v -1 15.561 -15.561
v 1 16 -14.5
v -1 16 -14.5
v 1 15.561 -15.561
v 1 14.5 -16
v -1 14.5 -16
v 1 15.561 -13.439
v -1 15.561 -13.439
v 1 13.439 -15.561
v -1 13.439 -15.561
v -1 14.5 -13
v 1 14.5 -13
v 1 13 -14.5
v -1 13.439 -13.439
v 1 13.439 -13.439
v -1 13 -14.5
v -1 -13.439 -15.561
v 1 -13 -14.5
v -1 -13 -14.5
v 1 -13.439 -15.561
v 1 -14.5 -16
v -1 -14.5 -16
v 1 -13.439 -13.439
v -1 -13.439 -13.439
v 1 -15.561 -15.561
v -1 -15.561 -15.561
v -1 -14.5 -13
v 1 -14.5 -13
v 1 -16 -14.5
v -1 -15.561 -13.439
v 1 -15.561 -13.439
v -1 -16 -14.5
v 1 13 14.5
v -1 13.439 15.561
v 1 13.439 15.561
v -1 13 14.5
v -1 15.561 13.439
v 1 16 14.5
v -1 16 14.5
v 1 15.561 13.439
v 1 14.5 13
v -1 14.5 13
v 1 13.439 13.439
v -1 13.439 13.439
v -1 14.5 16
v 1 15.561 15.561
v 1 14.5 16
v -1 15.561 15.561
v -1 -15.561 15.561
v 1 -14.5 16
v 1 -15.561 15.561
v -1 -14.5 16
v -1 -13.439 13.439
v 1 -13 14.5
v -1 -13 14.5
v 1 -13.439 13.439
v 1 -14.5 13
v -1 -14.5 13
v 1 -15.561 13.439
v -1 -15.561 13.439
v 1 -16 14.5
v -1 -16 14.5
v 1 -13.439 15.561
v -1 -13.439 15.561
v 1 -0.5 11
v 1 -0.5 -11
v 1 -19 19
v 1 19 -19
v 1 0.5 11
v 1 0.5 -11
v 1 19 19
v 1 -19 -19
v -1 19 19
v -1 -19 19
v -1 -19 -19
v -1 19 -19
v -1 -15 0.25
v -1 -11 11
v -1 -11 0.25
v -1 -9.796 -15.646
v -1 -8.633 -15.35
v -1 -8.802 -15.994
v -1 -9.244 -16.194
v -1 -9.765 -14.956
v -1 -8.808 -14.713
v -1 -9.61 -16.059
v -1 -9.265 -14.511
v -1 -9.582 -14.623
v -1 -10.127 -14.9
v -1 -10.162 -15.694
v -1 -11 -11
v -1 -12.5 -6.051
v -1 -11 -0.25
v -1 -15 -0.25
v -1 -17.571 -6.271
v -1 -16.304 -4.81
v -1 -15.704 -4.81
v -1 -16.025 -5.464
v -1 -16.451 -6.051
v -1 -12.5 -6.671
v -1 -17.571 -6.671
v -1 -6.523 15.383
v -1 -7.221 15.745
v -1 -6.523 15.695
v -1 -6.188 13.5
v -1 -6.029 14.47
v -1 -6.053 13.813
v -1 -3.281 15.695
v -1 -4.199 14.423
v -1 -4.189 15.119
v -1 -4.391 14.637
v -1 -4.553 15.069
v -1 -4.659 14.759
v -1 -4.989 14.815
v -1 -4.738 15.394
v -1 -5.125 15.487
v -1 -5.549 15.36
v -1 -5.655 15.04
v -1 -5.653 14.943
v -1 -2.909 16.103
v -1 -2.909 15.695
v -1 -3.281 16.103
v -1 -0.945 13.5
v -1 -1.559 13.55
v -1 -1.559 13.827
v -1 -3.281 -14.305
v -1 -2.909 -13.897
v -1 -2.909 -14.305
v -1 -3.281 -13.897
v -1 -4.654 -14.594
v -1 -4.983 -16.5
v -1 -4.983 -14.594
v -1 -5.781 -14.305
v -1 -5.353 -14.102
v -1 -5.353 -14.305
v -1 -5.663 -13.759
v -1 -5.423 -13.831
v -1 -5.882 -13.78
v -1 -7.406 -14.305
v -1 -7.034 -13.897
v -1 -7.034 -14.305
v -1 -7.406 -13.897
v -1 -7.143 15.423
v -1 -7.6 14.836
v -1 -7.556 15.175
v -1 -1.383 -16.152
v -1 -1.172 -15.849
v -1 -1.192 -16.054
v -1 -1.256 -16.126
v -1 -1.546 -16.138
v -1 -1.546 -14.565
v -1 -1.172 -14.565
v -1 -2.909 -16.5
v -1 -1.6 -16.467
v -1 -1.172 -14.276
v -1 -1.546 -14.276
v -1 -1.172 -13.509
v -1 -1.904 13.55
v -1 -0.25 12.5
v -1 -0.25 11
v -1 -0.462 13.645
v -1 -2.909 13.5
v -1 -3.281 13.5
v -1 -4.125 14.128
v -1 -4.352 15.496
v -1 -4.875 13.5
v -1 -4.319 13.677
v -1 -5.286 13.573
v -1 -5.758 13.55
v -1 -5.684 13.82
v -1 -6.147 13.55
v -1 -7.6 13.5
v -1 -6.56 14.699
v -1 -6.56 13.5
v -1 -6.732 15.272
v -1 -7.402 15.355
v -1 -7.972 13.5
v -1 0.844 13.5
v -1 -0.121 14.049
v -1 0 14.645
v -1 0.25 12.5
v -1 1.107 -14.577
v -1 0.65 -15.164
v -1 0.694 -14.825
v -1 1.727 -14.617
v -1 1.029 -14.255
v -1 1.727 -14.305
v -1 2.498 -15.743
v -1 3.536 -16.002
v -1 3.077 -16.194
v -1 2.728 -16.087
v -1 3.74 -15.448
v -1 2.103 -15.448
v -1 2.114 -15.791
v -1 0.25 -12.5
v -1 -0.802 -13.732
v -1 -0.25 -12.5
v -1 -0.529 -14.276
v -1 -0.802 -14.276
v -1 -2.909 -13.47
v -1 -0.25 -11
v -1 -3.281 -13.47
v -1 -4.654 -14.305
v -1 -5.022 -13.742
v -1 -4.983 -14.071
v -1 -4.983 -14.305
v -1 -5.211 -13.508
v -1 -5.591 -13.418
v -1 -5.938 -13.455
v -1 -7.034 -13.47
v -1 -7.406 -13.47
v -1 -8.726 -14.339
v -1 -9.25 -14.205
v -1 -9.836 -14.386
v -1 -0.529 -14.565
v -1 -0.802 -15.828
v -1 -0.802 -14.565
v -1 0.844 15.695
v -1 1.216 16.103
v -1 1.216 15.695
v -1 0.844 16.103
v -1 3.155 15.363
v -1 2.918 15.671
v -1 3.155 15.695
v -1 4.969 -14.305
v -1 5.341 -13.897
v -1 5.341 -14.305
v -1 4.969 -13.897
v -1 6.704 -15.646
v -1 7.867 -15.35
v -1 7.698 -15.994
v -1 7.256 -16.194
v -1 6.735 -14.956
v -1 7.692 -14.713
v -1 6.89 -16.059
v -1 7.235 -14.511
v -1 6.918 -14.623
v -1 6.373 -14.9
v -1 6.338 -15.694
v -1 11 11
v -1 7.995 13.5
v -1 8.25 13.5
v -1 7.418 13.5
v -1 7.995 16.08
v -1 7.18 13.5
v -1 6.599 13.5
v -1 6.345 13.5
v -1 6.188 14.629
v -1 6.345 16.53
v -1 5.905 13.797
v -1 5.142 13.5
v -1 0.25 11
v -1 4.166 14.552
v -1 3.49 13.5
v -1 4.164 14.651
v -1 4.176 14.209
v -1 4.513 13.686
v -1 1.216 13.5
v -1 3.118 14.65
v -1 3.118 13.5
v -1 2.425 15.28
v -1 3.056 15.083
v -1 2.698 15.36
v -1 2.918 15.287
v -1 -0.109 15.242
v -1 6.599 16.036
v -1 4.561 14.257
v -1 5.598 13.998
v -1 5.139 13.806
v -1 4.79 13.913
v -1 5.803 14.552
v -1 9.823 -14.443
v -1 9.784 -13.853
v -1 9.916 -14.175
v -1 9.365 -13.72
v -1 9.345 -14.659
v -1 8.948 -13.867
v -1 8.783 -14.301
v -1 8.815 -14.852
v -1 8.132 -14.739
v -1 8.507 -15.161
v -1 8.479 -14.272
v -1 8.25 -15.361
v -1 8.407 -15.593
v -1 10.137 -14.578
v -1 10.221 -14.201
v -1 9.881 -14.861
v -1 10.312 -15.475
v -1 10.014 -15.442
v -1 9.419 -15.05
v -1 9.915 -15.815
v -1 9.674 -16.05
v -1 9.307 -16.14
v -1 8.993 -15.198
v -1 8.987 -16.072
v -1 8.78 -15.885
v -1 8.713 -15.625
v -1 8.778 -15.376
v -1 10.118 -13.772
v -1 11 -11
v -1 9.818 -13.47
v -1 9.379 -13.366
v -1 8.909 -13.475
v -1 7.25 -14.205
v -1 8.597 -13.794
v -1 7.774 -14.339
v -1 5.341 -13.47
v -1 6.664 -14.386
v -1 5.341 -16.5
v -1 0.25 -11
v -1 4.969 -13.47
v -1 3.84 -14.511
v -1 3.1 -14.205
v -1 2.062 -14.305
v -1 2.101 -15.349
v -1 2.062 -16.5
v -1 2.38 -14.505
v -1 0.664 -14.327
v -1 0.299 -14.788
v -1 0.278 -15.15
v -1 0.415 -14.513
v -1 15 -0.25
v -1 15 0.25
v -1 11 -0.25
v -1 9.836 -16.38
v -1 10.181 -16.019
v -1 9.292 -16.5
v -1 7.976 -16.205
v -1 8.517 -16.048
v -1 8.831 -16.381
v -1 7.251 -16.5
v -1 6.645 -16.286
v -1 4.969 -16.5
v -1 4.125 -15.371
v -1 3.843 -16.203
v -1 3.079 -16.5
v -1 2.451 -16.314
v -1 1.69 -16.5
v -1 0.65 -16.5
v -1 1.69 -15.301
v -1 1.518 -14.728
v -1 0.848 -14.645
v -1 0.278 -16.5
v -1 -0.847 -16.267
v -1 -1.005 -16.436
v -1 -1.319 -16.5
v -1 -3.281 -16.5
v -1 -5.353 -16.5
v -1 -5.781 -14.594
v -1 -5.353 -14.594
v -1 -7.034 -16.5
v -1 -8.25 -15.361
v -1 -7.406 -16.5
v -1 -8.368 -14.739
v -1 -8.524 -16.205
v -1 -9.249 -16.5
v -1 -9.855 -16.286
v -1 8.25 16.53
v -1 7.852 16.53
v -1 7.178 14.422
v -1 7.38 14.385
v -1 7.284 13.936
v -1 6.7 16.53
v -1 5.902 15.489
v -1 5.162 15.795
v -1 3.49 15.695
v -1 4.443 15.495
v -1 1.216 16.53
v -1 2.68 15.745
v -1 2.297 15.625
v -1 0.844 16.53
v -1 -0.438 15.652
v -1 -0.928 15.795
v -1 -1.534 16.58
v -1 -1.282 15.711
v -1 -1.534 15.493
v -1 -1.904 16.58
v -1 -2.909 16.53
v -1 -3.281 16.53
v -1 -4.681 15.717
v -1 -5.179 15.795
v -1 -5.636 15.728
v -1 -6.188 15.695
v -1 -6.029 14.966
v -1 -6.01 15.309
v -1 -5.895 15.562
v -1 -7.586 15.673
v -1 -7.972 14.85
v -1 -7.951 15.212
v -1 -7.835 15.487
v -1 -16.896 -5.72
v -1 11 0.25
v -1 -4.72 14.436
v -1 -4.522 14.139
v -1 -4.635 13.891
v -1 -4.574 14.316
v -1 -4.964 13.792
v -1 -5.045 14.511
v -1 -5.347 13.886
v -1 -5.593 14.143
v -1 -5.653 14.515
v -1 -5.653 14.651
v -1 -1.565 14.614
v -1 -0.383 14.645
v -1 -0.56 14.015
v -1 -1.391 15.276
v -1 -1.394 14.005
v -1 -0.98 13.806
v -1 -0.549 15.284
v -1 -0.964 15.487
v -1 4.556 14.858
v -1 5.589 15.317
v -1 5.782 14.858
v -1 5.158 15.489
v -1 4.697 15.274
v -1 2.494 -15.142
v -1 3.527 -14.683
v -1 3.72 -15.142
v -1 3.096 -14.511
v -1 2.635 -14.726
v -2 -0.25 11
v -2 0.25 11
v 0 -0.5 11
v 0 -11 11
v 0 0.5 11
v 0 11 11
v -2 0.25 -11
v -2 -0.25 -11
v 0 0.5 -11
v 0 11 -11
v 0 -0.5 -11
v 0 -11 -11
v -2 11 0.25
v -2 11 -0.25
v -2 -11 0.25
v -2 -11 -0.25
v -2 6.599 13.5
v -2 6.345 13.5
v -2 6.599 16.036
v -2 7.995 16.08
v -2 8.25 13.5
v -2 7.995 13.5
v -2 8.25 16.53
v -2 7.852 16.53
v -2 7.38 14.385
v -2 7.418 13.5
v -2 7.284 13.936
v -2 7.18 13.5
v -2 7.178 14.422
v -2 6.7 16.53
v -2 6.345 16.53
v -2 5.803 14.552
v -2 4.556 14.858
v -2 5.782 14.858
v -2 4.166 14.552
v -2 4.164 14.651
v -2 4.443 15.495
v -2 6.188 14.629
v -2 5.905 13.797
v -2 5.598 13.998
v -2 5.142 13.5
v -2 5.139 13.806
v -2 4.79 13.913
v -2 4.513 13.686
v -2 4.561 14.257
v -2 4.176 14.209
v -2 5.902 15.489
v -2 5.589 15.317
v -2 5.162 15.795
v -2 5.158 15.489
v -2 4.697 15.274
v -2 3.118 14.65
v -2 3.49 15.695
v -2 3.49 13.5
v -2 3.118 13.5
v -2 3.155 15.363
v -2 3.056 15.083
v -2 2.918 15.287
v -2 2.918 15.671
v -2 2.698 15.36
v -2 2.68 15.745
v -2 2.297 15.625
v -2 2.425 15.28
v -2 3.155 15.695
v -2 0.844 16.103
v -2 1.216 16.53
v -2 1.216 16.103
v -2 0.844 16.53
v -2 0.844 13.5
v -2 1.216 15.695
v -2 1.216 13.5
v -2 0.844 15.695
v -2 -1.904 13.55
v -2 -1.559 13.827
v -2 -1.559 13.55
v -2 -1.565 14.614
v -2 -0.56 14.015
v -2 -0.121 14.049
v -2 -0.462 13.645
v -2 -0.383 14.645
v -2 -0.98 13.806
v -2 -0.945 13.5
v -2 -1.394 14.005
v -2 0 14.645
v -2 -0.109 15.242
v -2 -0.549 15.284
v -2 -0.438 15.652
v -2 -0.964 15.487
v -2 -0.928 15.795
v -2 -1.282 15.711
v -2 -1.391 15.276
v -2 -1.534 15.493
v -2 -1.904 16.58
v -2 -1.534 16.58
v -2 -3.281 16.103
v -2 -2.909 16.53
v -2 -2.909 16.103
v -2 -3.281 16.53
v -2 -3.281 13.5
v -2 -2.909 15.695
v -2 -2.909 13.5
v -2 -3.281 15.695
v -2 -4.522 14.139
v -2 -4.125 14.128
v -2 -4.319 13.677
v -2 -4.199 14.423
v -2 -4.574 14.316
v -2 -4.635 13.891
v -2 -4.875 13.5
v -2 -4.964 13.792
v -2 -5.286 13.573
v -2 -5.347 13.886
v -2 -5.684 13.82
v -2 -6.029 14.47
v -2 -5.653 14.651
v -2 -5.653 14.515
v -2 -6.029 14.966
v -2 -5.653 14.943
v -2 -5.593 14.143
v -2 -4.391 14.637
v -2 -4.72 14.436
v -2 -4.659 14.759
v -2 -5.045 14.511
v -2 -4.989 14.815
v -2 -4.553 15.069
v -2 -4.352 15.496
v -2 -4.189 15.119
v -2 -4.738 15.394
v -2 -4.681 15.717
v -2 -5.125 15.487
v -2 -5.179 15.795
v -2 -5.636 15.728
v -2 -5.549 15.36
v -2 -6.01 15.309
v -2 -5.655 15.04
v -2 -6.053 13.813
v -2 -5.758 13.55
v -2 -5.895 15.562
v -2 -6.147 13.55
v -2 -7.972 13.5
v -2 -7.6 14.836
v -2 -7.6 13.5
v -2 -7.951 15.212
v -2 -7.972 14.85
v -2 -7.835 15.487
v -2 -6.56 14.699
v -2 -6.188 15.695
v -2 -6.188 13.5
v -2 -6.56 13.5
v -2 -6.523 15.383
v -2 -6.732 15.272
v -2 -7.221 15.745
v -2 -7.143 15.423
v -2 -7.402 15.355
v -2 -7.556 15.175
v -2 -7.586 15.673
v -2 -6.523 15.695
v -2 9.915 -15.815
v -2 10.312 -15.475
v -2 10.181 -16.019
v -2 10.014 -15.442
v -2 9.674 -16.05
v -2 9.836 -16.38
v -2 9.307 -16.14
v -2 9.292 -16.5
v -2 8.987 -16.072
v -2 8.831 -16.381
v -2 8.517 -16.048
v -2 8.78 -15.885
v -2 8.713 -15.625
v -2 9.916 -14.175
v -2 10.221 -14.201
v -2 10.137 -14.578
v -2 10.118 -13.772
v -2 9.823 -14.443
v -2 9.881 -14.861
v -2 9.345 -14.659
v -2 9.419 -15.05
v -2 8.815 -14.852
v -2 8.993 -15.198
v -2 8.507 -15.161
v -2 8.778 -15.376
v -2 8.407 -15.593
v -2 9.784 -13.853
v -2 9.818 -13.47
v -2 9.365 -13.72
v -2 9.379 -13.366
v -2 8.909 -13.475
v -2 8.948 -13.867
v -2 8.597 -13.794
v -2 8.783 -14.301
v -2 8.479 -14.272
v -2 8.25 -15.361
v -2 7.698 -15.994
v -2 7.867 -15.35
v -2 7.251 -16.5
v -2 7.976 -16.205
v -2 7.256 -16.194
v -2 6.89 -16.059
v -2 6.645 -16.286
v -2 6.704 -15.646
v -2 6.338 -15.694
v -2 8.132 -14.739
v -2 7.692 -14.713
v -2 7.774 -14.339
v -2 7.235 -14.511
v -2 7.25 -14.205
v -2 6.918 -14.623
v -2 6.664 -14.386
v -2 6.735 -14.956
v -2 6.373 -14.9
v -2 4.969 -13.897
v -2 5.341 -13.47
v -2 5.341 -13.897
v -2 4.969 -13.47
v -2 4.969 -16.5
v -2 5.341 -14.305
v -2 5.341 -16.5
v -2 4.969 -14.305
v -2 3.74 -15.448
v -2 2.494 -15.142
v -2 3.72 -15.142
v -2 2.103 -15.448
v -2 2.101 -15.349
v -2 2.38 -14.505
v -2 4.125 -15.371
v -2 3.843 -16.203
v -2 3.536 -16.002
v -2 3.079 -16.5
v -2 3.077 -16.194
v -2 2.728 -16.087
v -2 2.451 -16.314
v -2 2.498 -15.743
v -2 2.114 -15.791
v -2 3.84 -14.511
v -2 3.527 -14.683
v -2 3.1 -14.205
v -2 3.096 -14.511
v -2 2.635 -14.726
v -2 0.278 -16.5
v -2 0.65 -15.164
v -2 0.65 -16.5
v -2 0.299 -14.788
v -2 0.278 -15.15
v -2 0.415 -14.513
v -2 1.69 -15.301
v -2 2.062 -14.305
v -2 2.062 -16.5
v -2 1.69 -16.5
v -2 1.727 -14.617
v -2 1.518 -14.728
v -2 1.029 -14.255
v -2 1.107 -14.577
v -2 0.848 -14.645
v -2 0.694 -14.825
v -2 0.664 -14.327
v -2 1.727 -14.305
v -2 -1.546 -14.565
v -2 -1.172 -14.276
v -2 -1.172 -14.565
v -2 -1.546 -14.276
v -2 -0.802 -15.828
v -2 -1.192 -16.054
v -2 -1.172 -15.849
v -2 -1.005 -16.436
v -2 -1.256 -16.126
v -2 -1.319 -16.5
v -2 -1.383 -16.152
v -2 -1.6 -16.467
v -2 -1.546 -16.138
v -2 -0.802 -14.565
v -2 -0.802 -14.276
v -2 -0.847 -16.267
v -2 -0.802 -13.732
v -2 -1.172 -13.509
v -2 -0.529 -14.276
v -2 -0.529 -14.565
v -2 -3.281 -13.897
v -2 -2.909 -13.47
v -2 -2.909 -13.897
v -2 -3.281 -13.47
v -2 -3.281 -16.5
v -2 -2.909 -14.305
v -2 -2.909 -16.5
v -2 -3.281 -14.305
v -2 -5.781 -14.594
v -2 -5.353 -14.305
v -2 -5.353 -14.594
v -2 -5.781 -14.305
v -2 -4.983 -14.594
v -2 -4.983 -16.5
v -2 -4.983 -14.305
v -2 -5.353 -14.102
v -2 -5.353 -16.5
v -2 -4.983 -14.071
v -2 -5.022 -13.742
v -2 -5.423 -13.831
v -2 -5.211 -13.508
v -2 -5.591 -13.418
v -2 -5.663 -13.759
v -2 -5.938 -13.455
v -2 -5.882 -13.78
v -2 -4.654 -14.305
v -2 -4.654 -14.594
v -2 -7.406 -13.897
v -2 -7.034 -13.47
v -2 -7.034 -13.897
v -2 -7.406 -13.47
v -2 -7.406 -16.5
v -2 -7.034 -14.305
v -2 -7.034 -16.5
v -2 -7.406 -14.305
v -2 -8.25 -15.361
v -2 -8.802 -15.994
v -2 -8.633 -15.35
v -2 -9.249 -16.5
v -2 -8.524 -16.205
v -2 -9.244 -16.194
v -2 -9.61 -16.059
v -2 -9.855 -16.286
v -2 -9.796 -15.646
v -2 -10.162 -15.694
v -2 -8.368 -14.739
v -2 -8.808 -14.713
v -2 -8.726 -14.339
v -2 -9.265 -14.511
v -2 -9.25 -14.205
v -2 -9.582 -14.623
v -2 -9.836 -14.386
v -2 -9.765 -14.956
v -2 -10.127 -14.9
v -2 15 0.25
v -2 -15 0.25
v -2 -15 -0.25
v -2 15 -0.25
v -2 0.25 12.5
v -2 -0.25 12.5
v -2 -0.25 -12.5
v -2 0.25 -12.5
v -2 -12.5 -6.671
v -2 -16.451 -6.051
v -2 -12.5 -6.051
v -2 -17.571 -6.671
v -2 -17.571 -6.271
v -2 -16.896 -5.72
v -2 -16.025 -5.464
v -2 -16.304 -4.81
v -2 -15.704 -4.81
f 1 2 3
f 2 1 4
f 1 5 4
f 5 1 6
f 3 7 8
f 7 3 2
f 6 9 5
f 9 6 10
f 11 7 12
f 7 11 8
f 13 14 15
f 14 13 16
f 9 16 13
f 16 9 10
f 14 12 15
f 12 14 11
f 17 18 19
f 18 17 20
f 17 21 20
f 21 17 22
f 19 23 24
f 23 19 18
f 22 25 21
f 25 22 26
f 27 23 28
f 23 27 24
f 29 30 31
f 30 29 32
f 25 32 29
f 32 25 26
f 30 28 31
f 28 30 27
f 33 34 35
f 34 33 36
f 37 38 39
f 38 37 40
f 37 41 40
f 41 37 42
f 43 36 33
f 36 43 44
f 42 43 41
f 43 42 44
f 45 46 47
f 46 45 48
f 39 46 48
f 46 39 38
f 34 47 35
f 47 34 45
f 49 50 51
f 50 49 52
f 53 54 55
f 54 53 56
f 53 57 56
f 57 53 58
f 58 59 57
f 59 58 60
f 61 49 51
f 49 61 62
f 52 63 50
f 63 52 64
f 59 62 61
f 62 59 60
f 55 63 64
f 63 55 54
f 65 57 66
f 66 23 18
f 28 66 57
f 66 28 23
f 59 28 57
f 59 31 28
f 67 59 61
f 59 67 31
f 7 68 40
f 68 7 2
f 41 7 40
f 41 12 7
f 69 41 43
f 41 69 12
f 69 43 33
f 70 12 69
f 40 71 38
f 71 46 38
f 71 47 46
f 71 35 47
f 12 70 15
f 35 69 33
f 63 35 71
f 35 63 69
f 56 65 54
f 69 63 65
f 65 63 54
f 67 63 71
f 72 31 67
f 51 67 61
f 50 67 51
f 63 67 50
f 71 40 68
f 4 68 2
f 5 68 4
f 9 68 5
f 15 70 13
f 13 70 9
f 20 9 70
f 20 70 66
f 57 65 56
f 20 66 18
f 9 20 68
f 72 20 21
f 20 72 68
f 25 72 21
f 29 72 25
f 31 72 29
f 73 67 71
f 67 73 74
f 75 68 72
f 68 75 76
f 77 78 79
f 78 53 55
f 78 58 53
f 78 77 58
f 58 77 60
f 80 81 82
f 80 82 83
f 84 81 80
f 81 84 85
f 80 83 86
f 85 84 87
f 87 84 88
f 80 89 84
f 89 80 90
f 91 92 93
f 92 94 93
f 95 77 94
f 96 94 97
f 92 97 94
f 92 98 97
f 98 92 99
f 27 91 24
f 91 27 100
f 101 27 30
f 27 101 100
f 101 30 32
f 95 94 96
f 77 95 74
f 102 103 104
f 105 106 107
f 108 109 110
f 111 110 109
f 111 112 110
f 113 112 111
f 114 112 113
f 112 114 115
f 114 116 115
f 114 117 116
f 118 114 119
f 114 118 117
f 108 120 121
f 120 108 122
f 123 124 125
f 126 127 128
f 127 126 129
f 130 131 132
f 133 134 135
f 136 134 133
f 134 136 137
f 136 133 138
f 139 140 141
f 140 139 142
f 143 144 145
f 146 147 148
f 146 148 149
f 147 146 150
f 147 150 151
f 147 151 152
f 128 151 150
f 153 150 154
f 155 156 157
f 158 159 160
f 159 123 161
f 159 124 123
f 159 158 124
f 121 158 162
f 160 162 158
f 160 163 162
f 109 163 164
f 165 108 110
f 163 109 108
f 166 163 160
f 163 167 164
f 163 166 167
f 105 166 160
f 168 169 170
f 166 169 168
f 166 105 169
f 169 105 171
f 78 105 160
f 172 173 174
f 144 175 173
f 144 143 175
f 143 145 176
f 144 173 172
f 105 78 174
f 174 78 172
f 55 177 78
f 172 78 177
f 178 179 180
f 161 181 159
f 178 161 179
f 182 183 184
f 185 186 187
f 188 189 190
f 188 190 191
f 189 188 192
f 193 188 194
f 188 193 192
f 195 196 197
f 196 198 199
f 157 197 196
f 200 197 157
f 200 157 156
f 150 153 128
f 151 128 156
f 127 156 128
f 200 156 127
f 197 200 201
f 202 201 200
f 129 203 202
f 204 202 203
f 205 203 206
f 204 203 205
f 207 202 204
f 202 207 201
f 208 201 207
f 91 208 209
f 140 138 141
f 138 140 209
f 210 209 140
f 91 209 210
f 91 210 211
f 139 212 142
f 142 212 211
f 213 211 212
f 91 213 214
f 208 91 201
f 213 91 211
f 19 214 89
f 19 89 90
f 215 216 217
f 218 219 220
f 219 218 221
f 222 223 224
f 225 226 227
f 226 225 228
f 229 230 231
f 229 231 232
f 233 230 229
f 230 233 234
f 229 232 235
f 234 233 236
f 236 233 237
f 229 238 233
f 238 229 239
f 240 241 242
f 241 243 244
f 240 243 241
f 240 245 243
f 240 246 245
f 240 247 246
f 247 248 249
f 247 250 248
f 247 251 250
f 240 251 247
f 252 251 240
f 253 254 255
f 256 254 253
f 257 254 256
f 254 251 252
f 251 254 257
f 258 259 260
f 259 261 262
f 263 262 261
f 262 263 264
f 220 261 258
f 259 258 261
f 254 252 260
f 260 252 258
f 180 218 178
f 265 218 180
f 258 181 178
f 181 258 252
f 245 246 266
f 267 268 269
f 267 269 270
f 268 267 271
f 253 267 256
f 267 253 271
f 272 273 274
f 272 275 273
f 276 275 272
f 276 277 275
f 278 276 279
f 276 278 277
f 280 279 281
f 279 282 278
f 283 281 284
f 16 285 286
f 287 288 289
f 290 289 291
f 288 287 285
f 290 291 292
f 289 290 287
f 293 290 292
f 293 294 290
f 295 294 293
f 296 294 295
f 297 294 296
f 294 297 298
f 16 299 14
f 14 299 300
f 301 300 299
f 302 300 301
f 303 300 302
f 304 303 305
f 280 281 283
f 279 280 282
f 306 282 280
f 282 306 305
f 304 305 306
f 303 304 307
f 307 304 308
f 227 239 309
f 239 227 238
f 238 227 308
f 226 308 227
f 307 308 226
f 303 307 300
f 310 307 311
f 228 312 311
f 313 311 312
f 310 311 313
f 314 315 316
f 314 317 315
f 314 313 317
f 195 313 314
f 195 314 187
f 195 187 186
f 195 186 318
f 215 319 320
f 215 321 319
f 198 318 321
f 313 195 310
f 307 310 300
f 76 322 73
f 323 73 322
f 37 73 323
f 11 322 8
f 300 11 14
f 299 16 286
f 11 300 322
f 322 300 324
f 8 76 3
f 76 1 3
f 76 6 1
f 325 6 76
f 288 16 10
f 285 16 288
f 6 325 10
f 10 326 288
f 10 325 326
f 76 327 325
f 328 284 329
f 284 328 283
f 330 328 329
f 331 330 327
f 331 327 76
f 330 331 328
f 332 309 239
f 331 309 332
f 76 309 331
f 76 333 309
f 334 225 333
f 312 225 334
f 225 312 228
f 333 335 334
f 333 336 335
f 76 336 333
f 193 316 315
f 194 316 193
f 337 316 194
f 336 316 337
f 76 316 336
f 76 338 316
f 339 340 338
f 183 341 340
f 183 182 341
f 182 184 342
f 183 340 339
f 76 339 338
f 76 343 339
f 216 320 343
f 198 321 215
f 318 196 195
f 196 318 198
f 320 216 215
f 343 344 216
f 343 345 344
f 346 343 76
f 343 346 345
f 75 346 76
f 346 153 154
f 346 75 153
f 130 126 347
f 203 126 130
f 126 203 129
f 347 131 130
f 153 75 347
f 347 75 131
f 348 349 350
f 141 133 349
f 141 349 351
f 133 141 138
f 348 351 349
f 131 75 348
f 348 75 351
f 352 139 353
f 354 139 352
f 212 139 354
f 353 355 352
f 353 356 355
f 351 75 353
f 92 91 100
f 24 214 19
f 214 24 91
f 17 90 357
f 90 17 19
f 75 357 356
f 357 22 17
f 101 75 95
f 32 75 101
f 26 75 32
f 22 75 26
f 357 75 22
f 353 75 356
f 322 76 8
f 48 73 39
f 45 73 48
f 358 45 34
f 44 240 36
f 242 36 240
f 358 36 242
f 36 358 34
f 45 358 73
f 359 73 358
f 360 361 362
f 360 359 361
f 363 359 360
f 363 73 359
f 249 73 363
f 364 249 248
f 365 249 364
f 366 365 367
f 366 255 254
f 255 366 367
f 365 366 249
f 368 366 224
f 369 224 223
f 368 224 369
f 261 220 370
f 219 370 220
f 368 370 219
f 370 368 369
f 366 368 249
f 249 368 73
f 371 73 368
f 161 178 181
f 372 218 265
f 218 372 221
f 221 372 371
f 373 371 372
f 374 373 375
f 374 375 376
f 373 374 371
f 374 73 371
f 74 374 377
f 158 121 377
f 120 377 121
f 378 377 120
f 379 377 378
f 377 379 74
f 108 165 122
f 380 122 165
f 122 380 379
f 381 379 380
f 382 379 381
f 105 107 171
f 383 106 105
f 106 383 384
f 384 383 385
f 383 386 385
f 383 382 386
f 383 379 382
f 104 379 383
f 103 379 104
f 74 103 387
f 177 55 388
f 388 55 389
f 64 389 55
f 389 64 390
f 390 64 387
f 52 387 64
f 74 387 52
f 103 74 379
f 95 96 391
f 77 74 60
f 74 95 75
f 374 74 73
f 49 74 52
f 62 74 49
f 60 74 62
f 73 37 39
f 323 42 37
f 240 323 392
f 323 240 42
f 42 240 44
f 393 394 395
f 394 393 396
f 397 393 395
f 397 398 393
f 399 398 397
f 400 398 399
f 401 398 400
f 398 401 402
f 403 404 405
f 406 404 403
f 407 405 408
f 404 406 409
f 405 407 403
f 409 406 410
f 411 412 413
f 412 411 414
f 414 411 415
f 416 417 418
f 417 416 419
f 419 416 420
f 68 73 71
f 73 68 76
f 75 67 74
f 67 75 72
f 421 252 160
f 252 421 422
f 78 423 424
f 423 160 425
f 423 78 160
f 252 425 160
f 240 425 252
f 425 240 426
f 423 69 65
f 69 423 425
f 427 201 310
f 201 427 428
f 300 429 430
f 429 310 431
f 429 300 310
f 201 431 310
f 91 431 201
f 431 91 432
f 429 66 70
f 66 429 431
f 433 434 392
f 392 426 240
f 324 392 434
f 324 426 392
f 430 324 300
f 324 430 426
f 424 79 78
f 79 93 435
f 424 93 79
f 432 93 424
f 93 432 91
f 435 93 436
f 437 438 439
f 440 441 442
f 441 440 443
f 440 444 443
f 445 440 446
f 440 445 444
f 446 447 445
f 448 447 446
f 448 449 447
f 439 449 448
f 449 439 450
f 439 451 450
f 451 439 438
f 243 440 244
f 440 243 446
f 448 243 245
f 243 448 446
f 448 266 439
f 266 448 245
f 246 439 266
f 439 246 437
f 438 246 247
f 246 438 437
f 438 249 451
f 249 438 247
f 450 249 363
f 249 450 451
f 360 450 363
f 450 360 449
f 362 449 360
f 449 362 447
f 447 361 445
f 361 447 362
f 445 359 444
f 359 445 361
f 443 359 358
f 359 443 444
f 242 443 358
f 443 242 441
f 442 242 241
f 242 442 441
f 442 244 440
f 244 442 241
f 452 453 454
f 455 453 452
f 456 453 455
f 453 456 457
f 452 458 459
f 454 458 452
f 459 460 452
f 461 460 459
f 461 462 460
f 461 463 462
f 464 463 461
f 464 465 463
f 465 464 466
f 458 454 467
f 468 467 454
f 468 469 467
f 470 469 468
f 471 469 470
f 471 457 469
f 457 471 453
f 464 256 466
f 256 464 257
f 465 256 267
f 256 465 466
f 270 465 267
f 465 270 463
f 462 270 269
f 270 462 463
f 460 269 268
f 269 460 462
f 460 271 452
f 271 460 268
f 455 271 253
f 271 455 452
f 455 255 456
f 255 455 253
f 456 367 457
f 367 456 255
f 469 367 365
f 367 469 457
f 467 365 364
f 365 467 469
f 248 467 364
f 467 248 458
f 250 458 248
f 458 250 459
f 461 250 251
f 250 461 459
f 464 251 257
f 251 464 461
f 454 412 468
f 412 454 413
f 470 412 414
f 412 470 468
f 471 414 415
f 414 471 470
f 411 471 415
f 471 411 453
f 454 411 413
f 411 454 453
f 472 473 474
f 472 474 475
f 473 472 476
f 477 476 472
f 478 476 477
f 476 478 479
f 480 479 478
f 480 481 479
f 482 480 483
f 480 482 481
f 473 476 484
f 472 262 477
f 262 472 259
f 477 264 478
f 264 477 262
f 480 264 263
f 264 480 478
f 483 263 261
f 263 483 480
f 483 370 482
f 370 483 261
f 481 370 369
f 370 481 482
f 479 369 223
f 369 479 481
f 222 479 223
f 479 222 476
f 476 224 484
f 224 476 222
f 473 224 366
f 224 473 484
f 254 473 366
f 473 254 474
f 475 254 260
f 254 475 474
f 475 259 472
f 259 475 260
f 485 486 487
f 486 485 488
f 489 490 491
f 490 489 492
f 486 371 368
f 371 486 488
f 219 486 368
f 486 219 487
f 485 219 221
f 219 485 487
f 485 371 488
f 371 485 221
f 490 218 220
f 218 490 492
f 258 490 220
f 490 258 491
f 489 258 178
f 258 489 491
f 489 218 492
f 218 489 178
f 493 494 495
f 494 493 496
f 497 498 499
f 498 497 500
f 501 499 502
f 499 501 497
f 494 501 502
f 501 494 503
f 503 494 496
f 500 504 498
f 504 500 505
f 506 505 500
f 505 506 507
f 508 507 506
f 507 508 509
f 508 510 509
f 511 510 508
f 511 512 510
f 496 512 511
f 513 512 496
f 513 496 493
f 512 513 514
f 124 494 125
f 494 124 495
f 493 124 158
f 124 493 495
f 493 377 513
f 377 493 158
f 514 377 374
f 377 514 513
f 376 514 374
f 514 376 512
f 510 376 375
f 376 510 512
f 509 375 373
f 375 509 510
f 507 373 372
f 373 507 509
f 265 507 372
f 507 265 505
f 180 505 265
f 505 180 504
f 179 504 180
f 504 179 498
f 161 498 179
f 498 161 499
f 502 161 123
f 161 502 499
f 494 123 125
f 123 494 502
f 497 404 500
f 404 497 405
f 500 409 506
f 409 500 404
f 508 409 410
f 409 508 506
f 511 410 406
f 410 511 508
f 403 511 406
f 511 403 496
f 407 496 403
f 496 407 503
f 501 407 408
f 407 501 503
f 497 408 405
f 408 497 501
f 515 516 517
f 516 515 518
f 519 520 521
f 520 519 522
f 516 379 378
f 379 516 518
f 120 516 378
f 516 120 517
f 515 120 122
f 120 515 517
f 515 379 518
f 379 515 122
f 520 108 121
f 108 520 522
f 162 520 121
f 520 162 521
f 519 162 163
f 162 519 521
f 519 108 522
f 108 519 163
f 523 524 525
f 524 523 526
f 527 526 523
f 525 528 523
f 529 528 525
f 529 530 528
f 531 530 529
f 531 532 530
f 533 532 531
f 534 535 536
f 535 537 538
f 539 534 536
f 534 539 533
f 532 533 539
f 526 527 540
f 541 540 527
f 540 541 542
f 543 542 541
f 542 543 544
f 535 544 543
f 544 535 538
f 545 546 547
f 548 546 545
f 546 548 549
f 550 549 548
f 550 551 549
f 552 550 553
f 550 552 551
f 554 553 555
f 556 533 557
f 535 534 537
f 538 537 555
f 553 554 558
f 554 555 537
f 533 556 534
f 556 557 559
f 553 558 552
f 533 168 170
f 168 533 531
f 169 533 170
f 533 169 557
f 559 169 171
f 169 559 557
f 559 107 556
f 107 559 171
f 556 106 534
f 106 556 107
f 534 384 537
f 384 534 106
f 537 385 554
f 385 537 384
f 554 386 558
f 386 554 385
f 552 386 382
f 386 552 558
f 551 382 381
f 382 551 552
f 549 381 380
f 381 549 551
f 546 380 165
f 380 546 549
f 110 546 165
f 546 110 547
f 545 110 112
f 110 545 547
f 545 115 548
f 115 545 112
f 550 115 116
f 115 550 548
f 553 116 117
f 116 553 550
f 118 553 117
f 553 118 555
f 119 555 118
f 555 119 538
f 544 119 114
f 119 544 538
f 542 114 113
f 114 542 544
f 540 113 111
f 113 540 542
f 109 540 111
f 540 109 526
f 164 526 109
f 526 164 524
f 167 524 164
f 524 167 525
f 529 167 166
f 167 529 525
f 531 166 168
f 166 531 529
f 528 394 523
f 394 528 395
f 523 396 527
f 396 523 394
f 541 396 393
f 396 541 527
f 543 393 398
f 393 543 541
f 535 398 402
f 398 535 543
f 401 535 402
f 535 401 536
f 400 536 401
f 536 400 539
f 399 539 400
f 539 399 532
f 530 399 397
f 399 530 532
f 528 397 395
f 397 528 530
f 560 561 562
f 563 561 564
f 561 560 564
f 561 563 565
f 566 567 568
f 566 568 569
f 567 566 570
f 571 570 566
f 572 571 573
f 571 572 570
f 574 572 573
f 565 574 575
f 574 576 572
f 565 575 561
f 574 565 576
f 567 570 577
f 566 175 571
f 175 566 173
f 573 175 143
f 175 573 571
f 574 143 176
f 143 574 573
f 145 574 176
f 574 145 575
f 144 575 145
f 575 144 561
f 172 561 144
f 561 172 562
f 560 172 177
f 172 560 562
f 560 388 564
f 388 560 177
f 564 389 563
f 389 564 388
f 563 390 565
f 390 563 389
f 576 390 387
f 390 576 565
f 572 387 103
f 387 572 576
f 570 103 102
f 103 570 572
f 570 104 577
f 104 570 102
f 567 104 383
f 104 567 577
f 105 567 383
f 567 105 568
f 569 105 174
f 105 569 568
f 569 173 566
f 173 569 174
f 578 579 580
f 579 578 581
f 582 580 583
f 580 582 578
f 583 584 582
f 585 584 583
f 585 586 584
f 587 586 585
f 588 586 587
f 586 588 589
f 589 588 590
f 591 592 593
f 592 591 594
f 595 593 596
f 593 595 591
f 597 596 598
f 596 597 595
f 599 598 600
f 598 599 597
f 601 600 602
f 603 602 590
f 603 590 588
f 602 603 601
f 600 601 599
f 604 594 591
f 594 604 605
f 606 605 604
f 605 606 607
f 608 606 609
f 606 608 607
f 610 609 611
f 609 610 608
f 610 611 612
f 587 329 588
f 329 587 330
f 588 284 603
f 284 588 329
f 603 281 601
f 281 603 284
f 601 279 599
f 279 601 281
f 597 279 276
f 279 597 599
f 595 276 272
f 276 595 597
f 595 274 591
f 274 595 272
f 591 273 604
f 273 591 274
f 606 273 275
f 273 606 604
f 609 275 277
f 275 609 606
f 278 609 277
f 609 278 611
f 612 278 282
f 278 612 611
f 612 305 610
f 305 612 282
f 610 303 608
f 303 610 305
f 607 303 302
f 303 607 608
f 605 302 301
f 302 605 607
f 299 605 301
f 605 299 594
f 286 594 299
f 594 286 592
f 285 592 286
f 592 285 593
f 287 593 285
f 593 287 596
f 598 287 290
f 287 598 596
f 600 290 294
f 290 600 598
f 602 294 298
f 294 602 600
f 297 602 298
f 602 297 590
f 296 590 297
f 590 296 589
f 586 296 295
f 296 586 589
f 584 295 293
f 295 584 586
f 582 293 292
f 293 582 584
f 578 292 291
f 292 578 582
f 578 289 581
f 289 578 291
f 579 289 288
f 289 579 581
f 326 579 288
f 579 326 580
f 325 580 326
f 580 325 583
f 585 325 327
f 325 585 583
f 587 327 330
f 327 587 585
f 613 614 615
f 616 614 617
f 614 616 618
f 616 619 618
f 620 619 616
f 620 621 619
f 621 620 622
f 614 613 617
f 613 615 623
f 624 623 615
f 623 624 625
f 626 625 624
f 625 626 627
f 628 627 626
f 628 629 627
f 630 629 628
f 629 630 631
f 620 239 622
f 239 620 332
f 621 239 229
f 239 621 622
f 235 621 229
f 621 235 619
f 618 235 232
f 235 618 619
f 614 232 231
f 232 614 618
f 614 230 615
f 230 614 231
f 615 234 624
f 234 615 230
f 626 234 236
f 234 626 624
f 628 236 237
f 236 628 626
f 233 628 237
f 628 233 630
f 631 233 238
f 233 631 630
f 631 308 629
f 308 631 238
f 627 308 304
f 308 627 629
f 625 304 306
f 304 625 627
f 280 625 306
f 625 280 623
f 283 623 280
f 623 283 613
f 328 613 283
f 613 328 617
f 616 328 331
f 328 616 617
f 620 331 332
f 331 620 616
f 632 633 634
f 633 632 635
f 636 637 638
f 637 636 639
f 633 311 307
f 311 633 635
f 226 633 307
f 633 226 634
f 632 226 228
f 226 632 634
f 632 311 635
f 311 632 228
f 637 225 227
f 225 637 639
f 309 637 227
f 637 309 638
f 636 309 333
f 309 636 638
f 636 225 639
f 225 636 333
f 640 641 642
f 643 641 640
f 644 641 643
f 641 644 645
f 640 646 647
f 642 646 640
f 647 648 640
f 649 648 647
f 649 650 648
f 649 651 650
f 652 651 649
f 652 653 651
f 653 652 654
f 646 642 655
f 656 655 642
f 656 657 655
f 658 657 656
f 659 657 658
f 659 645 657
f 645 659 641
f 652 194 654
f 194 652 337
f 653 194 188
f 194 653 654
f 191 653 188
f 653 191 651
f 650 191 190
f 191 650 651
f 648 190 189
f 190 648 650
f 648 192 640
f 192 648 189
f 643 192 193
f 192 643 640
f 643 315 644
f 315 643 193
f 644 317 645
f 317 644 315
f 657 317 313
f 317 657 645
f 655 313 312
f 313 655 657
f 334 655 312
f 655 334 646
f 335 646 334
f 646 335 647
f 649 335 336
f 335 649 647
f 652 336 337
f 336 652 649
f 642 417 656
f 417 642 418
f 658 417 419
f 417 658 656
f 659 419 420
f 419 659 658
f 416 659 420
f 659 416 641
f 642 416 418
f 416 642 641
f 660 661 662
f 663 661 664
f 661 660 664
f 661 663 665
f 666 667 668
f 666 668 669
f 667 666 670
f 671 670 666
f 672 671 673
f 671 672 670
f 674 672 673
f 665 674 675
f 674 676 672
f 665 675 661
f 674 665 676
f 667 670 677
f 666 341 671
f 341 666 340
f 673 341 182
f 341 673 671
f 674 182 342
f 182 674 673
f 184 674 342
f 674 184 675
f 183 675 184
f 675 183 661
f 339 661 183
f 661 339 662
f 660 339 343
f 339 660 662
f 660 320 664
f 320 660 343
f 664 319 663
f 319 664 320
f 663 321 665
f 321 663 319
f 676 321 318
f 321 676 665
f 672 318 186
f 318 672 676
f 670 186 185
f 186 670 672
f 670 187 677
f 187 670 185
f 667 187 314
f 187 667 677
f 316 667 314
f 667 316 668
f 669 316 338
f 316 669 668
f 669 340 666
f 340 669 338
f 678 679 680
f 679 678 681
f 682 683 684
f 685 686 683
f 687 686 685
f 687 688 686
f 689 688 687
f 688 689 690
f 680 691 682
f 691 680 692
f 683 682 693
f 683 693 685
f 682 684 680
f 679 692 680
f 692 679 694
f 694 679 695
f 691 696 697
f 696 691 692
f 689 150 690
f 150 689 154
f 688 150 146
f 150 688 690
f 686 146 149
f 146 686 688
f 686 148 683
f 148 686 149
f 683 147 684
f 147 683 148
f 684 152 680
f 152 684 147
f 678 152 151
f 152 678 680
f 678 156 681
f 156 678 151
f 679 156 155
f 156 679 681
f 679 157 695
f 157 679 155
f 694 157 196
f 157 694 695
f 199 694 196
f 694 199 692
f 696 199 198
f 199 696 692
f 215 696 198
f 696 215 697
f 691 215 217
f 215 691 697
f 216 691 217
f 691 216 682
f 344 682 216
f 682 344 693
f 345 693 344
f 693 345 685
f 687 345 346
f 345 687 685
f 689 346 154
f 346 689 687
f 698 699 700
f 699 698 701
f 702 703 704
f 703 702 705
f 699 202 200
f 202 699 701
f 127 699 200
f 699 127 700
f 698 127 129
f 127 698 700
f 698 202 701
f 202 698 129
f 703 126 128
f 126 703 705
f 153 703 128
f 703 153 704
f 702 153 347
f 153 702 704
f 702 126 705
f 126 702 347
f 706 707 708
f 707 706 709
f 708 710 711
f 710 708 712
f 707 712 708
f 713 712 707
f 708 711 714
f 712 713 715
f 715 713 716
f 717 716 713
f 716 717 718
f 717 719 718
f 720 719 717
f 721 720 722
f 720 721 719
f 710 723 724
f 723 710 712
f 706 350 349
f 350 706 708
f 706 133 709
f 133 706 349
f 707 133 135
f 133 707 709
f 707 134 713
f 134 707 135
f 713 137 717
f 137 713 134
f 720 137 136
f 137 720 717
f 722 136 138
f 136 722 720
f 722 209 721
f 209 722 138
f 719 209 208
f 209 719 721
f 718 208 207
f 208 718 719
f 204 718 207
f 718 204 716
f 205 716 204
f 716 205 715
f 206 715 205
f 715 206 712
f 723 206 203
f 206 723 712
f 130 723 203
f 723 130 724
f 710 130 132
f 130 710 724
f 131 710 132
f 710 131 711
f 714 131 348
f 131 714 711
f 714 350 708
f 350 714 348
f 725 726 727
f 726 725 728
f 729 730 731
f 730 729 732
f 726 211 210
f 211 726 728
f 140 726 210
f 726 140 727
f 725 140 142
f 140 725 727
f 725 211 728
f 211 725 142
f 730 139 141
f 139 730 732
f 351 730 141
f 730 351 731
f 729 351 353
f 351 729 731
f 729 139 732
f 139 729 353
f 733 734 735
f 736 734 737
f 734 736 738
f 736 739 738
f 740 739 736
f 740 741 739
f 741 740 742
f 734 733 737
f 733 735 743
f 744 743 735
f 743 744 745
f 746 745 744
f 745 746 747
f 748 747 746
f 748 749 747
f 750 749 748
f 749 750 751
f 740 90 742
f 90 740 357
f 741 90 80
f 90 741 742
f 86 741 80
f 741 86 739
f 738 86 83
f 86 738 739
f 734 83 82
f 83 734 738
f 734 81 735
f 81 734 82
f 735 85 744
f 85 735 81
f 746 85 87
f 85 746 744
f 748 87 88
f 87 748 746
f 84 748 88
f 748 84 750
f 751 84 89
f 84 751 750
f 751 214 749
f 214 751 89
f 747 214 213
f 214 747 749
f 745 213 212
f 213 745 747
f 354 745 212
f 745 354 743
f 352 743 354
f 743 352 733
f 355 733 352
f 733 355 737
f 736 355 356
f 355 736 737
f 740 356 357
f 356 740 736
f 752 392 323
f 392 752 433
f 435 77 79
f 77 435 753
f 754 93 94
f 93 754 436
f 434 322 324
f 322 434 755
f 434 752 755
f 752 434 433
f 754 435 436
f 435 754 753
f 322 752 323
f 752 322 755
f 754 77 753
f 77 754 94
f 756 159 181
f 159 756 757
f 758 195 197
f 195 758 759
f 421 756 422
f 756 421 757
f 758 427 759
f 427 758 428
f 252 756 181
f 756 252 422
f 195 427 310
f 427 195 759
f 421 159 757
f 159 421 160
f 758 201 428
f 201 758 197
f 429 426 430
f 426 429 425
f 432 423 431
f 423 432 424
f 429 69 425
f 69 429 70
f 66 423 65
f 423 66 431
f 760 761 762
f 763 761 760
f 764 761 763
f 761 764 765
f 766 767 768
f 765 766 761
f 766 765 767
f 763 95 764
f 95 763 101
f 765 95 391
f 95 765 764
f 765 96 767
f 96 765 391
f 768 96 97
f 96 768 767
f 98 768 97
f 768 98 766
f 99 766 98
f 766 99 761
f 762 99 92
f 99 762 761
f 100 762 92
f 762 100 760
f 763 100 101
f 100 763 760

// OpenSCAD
// file: opticsMount_retainingBracket.scad
use <write.scad>

module retainingBracket(){
	difference(){	
		translate([0,0,0]) color([.7,.9,.2]) cube(size=[2,38,38],center=true);
		translate([0,0,0]) cube(size=[6,22,22],center=true);
		rotate([0,90,0]){
			translate([14.5,14.5,0]) cylinder(h=5,r=1.5,$fn=8,center=true);			
			translate([14.5,-14.5,0]) cylinder(h=5,r=1.5,$fn=8,center=true);			
			translate([-14.5,14.5,0]) cylinder(h=5,r=1.5,$fn=8,center=true);			
			translate([-14.5,-14.5,0]) cylinder(h=5,r=1.5,$fn=8,center=true);		
		}
	}
	rotate([90,0,-90]){
		translate([0,15,1]){
			write("Meridian",h=3,t=2,center=true);
		}
	}
	rotate([90,0,-90]){
		translate([0,-15,1]){
			write("Scientific",h=3,t=2,center=true);
		}
	}
	difference(){
		translate([-1,0,0]) cube(size=[2,30,.5],center=true);	
		translate([0,0,0]) cube(size=[6,22,22],center=true);
	}
	difference(){
		translate([-1,0,0]) cube(size=[2,.5,25],center=true);	
		translate([0,0,0]) cube(size=[6,22,22],center=true);
	}
}

retainingBracket();
// main file
use <write.scad>
use <opticsMount_retainingBracket.scad>

module aperture(){
	difference(){
		translate([.5,0,0]) color([0.3,0.5,0.9]) cube(size=[1,22,22],center=true);
		translate([.5,0,0]) cube(size=[2,1,22],center=true);
	}
	rotate([90,90,-90]){
		translate([6,15,1]){
			write("1",h=5,t=2,center=true);
		}
	}
}

translate([0,0,0]){
	retainingBracket();
	aperture();
}
